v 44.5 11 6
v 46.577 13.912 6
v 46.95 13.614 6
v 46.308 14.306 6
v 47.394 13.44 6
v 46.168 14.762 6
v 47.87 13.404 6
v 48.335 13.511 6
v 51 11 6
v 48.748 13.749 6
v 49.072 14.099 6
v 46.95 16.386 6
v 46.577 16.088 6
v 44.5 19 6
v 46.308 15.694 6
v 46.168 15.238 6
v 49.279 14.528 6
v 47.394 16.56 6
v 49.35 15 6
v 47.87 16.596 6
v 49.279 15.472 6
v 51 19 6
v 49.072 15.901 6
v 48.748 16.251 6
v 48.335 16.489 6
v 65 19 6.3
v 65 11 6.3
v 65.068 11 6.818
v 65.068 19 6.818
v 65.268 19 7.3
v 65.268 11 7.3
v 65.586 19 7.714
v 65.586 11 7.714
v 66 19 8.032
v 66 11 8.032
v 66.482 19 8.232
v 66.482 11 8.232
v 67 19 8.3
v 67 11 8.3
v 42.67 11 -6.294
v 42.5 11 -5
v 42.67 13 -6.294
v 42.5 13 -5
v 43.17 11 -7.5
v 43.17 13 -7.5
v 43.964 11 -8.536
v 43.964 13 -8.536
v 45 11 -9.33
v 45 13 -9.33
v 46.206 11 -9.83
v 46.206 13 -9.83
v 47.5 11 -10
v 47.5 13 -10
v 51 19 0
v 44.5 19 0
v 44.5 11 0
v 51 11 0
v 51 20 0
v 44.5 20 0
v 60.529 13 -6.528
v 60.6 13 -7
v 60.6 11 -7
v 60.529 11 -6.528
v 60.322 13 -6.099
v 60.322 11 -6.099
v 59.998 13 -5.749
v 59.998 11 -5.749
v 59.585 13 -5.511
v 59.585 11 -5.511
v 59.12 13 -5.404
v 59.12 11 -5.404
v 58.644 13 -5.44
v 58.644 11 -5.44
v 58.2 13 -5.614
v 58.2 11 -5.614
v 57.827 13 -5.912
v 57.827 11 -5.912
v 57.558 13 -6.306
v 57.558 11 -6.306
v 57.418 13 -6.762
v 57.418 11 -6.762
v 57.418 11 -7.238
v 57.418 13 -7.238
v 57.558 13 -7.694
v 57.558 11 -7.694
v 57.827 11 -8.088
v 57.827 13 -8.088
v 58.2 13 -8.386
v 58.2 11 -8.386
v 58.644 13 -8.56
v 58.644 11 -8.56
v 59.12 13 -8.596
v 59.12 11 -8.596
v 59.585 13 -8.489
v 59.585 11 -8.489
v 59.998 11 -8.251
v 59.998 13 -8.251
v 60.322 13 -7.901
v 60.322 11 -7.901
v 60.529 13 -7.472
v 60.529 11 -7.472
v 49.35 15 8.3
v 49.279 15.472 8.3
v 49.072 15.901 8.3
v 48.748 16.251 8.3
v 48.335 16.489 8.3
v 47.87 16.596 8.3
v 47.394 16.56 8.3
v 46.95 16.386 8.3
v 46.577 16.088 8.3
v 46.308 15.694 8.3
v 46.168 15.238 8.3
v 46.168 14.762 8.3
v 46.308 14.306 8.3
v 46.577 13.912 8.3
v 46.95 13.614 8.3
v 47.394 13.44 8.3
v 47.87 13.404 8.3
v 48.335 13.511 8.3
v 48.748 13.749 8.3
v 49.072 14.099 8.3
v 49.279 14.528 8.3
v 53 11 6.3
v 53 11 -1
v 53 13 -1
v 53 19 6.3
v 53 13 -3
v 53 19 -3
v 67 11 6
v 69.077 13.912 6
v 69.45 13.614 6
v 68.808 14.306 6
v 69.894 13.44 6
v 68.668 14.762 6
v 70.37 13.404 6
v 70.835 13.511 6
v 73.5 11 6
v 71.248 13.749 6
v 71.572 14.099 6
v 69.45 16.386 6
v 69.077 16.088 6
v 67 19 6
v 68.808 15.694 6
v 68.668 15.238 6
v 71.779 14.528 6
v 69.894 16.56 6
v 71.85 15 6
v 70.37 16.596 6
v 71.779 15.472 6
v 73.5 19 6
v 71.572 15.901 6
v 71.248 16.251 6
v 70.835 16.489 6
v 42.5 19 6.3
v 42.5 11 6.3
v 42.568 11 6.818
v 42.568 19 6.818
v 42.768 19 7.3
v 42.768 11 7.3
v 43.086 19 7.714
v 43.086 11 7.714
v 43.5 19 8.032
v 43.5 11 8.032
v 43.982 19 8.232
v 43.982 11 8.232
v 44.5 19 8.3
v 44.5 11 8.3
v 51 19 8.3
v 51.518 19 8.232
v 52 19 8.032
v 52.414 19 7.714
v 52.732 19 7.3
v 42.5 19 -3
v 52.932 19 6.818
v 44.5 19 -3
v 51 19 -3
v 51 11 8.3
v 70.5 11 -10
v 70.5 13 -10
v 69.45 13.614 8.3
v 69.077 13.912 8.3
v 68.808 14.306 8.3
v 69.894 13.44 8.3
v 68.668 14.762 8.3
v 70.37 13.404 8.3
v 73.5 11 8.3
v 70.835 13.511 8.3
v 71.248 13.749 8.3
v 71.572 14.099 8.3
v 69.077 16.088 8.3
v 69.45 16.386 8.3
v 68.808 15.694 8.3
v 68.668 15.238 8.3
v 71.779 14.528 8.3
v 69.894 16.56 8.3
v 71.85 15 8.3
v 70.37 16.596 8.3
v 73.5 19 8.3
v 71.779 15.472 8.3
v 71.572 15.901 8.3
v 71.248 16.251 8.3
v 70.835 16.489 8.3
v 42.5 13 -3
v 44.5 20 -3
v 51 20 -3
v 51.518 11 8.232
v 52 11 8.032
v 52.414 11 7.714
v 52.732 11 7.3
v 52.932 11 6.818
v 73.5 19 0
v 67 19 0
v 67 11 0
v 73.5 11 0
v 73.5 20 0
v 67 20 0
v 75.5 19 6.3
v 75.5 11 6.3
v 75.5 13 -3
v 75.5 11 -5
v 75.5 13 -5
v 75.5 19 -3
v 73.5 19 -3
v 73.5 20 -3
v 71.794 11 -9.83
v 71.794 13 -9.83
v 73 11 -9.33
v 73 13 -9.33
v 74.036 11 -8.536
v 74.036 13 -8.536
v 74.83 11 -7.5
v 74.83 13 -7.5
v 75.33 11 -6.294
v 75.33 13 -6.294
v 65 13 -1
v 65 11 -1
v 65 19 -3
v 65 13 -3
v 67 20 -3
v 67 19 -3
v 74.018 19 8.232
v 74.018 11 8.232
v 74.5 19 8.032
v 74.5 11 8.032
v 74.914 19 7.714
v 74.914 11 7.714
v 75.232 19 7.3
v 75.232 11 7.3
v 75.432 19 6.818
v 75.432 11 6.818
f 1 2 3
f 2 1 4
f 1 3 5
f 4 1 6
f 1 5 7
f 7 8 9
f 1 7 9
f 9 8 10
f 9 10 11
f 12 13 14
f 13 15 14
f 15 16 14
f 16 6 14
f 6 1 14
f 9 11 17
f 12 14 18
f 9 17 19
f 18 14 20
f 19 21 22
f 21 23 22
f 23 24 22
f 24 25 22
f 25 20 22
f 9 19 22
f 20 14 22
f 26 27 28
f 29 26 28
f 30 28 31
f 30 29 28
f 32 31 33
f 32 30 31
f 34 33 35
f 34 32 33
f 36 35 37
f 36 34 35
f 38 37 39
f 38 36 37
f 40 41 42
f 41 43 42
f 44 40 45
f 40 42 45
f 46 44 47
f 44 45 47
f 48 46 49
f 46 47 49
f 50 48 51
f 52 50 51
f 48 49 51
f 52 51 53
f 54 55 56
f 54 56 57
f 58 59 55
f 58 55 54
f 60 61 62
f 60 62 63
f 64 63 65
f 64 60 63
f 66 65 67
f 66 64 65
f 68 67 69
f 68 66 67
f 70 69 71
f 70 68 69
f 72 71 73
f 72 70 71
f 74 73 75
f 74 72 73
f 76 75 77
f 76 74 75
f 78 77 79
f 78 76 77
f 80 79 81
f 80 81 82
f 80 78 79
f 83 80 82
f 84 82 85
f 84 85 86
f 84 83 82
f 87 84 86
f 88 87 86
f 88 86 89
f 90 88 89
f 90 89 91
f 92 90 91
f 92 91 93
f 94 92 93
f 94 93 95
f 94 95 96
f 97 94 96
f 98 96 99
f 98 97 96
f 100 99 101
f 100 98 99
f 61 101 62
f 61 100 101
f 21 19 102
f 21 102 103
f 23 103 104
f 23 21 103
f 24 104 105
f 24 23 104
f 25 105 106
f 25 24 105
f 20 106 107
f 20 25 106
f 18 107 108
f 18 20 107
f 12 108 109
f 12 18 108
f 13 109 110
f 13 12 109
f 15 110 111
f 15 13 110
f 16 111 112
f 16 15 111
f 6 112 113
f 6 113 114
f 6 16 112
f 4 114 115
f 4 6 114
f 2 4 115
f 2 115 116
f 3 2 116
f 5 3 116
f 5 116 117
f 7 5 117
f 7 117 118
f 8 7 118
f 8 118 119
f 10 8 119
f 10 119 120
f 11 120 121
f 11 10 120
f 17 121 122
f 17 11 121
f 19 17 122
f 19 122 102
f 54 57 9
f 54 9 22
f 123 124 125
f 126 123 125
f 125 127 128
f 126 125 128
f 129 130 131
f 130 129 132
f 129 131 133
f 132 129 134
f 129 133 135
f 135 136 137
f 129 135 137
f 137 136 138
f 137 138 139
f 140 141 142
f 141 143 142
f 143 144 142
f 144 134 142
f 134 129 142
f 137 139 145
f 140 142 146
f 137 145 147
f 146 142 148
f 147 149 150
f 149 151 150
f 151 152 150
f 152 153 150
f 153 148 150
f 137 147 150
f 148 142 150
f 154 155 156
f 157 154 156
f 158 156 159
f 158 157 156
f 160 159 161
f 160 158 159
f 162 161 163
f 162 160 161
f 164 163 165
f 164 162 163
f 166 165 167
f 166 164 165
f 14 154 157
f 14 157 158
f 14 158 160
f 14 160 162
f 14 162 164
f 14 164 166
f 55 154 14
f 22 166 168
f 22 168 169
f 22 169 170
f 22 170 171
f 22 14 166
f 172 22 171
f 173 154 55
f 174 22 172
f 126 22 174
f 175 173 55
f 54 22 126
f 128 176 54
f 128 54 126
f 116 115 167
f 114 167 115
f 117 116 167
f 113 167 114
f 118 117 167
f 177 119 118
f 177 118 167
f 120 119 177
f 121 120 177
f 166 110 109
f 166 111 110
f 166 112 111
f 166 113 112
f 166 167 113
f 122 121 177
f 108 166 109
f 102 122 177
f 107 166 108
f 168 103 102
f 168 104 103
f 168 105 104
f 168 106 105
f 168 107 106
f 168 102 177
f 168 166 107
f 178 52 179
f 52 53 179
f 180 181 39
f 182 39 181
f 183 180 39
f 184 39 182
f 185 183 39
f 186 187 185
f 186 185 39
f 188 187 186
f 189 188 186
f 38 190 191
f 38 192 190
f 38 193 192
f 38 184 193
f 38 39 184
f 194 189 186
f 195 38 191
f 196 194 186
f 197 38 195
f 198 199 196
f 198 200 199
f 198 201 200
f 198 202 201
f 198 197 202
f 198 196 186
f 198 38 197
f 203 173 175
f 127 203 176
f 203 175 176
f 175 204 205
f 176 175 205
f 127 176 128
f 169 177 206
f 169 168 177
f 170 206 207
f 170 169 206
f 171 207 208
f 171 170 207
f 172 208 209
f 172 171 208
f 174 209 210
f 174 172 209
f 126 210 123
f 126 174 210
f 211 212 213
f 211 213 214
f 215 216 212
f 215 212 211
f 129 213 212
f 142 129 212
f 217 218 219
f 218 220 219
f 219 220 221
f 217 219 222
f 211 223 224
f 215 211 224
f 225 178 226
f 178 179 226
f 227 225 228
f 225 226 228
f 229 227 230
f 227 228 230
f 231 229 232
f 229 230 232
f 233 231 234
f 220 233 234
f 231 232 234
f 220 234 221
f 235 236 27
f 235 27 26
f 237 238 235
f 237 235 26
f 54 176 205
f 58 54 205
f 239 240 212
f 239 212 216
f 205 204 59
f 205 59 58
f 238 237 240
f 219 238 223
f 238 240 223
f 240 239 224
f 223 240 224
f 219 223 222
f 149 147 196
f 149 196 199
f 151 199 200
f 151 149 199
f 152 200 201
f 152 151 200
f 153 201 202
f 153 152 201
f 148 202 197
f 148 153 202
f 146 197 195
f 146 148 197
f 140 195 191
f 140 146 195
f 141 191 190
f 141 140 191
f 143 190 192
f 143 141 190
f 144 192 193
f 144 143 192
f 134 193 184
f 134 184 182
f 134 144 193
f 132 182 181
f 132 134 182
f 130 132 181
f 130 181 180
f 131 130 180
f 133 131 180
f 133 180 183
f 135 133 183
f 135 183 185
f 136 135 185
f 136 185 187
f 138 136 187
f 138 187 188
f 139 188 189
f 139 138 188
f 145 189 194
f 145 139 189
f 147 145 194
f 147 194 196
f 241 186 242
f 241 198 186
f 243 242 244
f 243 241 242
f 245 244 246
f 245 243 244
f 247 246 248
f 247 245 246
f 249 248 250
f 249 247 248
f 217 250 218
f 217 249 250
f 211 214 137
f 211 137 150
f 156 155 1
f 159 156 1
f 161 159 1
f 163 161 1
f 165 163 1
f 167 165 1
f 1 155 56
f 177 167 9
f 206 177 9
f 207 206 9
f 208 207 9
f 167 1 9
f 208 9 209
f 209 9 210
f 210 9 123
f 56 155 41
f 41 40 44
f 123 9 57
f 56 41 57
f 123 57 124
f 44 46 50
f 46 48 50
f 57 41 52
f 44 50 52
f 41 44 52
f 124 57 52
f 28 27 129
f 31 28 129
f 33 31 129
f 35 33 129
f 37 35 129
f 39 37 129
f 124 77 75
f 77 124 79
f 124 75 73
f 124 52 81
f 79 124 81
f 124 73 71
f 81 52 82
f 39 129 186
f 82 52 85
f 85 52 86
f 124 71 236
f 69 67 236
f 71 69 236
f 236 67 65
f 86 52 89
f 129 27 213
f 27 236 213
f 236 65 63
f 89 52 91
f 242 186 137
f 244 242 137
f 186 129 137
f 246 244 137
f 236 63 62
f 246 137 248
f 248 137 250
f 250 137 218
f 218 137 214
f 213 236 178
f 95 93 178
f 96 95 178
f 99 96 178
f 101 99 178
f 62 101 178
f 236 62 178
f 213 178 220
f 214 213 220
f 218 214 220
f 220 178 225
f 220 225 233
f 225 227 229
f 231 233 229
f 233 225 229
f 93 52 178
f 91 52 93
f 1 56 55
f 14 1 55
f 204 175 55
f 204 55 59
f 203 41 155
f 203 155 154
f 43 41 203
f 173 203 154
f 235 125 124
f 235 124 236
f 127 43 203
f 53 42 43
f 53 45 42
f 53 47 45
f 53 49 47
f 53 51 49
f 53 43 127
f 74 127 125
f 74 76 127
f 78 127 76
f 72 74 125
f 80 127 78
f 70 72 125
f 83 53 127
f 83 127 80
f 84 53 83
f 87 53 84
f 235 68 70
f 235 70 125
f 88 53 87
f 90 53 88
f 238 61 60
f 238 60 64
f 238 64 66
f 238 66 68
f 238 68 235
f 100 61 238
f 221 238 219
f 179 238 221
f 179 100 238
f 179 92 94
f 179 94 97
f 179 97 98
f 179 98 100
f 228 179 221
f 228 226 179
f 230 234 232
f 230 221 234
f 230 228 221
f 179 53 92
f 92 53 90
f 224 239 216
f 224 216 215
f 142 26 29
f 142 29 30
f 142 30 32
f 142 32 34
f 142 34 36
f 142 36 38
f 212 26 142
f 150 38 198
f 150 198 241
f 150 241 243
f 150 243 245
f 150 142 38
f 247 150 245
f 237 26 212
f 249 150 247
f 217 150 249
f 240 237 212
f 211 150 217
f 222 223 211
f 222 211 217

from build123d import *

# Parameters (mm, degrees)
CYLINDER077_R     = 1.6
CYLINDER077_DEPTH = 2.3
BOX189_W          = 10.5
BOX189_H          = 8
BOX189_DEPTH      = 2.3
FILLET046_R       = 2
CYLINDER078_R     = 1.6
CYLINDER078_DEPTH = 2.3
BOX190_W          = 10.5
BOX190_H          = 8
BOX190_DEPTH      = 2.3
FILLET045_R       = 2
BOX200_W          = 6.5
BOX200_H          = 9
BOX200_DEPTH      = 3
BOX199_W          = 2
BOX199_H          = 8
BOX199_DEPTH      = 9
BOX198_W          = 2
BOX198_H          = 8
BOX198_DEPTH      = 9
BOX197_W          = 6.5
BOX197_H          = 9
BOX197_DEPTH      = 3
BOX196_W          = 2
BOX196_H          = 8
BOX196_DEPTH      = 9
BOX195_W          = 2
BOX195_H          = 8
BOX195_DEPTH      = 9
CYLINDER076_R     = 1.6
CYLINDER076_DEPTH = 2
BOX194_W          = 33
BOX194_H          = 2
BOX194_DEPTH      = 9
FILLET047_R       = 5


with BuildPart() as cylinder158:
    # Cylinder077 → Cylinder077 (new body)
    with BuildSketch(Plane(origin=(47.75, 15, 6), x_dir=(1, 0, 0), z_dir=(0, 0, 1))):
        Circle(CYLINDER077_R)
    extrude(amount=CYLINDER077_DEPTH)


with BuildPart() as fillet046:
    # Box189 → Box189 (new body)
    with BuildSketch(Plane(origin=(42.5, 11, 6), x_dir=(1, 0, 0), z_dir=(0, 0, 1))):
        with Locations((5.25, 4)):
            Rectangle(BOX189_W, BOX189_H)
    extrude(amount=BOX189_DEPTH)

    # Cut100: cut Cylinder158
    add(cylinder158.part, mode=Mode.SUBTRACT)

    # Fillet046
    fillet046_edges = [fillet046.edges().sort_by_distance(p)[0] for p in [
        (42.5, 15, 8.3),
        (53, 15, 8.3),
    ]]
    fillet(fillet046_edges, radius=FILLET046_R)


with BuildPart() as cylinder159:
    # Cylinder078 → Cylinder078 (new body)
    with BuildSketch(Plane(origin=(70.25, 15, 6), x_dir=(1, 0, 0), z_dir=(0, 0, 1))):
        Circle(CYLINDER078_R)
    extrude(amount=CYLINDER078_DEPTH)


with BuildPart() as fillet045:
    # Box190 → Box190 (new body)
    with BuildSketch(Plane(origin=(65, 11, 6), x_dir=(1, 0, 0), z_dir=(0, 0, 1))):
        with Locations((5.25, 4)):
            Rectangle(BOX190_W, BOX190_H)
    extrude(amount=BOX190_DEPTH)

    # Cut101: cut Cylinder159
    add(cylinder159.part, mode=Mode.SUBTRACT)

    # Fillet045
    fillet045_edges = [fillet045.edges().sort_by_distance(p)[0] for p in [
        (65, 15, 8.3),
        (75.5, 15, 8.3),
    ]]
    fillet(fillet045_edges, radius=FILLET045_R)


with BuildPart() as cube189:
    # Box200 → Box200 (new body)
    with BuildSketch(Plane(origin=(44.5, 11, -3), x_dir=(1, 0, 0), z_dir=(0, 0, 1))):
        with Locations((3.25, 4.5)):
            Rectangle(BOX200_W, BOX200_H)
    extrude(amount=BOX200_DEPTH)


with BuildPart() as cube188:
    # Box199 → Box199 (new body)
    with BuildSketch(Plane(origin=(51, 11, -3), x_dir=(1, 0, 0), z_dir=(0, 0, 1))):
        with Locations((1, 4)):
            Rectangle(BOX199_W, BOX199_H)
    extrude(amount=BOX199_DEPTH)


with BuildPart() as cube187:
    # Box198 → Box198 (new body)
    with BuildSketch(Plane(origin=(42.5, 11, -3), x_dir=(1, 0, 0), z_dir=(0, 0, 1))):
        with Locations((1, 4)):
            Rectangle(BOX198_W, BOX198_H)
    extrude(amount=BOX198_DEPTH)


with BuildPart() as cube186:
    # Box197 → Box197 (new body)
    with BuildSketch(Plane(origin=(67, 11, -3), x_dir=(1, 0, 0), z_dir=(0, 0, 1))):
        with Locations((3.25, 4.5)):
            Rectangle(BOX197_W, BOX197_H)
    extrude(amount=BOX197_DEPTH)


with BuildPart() as cube185:
    # Box196 → Box196 (new body)
    with BuildSketch(Plane(origin=(73.5, 11, -3), x_dir=(1, 0, 0), z_dir=(0, 0, 1))):
        with Locations((1, 4)):
            Rectangle(BOX196_W, BOX196_H)
    extrude(amount=BOX196_DEPTH)


with BuildPart() as cube184:
    # Box195 → Box195 (new body)
    with BuildSketch(Plane(origin=(65, 11, -3), x_dir=(1, 0, 0), z_dir=(0, 0, 1))):
        with Locations((1, 4)):
            Rectangle(BOX195_W, BOX195_H)
    extrude(amount=BOX195_DEPTH)


with BuildPart() as cylinder157:
    # Cylinder076 → Cylinder076 (new body)
    with BuildSketch(Plane(origin=(59, 13, -7), x_dir=(1, 0, 0), z_dir=(0, -1, 0))):
        Circle(CYLINDER076_R)
    extrude(amount=CYLINDER076_DEPTH)


with BuildPart() as fusion061:
    # Box194 → Box194 (new body)
    with BuildSketch(Plane(origin=(42.5, 11, -10), x_dir=(1, 0, 0), z_dir=(0, 0, 1))):
        with Locations((16.5, 1)):
            Rectangle(BOX194_W, BOX194_H)
    extrude(amount=BOX194_DEPTH)

    # Cut102: cut Cylinder157
    add(cylinder157.part, mode=Mode.SUBTRACT)

    # Fillet047
    fillet047_edges = [fusion061.edges().sort_by_distance(p)[0] for p in [
        (42.5, 12, -10),
        (75.5, 12, -10),
    ]]
    fillet(fillet047_edges, radius=FILLET047_R)

    # Fusion061: union Fillet046, Fillet045, Cube189, Cube188, Cube187, Cube186, Cube185, Cube184
    add(fillet046.part)
    add(fillet045.part)
    add(cube189.part)
    add(cube188.part)
    add(cube187.part)
    add(cube186.part)
    add(cube185.part)
    add(cube184.part)


solid = fusion061.part
